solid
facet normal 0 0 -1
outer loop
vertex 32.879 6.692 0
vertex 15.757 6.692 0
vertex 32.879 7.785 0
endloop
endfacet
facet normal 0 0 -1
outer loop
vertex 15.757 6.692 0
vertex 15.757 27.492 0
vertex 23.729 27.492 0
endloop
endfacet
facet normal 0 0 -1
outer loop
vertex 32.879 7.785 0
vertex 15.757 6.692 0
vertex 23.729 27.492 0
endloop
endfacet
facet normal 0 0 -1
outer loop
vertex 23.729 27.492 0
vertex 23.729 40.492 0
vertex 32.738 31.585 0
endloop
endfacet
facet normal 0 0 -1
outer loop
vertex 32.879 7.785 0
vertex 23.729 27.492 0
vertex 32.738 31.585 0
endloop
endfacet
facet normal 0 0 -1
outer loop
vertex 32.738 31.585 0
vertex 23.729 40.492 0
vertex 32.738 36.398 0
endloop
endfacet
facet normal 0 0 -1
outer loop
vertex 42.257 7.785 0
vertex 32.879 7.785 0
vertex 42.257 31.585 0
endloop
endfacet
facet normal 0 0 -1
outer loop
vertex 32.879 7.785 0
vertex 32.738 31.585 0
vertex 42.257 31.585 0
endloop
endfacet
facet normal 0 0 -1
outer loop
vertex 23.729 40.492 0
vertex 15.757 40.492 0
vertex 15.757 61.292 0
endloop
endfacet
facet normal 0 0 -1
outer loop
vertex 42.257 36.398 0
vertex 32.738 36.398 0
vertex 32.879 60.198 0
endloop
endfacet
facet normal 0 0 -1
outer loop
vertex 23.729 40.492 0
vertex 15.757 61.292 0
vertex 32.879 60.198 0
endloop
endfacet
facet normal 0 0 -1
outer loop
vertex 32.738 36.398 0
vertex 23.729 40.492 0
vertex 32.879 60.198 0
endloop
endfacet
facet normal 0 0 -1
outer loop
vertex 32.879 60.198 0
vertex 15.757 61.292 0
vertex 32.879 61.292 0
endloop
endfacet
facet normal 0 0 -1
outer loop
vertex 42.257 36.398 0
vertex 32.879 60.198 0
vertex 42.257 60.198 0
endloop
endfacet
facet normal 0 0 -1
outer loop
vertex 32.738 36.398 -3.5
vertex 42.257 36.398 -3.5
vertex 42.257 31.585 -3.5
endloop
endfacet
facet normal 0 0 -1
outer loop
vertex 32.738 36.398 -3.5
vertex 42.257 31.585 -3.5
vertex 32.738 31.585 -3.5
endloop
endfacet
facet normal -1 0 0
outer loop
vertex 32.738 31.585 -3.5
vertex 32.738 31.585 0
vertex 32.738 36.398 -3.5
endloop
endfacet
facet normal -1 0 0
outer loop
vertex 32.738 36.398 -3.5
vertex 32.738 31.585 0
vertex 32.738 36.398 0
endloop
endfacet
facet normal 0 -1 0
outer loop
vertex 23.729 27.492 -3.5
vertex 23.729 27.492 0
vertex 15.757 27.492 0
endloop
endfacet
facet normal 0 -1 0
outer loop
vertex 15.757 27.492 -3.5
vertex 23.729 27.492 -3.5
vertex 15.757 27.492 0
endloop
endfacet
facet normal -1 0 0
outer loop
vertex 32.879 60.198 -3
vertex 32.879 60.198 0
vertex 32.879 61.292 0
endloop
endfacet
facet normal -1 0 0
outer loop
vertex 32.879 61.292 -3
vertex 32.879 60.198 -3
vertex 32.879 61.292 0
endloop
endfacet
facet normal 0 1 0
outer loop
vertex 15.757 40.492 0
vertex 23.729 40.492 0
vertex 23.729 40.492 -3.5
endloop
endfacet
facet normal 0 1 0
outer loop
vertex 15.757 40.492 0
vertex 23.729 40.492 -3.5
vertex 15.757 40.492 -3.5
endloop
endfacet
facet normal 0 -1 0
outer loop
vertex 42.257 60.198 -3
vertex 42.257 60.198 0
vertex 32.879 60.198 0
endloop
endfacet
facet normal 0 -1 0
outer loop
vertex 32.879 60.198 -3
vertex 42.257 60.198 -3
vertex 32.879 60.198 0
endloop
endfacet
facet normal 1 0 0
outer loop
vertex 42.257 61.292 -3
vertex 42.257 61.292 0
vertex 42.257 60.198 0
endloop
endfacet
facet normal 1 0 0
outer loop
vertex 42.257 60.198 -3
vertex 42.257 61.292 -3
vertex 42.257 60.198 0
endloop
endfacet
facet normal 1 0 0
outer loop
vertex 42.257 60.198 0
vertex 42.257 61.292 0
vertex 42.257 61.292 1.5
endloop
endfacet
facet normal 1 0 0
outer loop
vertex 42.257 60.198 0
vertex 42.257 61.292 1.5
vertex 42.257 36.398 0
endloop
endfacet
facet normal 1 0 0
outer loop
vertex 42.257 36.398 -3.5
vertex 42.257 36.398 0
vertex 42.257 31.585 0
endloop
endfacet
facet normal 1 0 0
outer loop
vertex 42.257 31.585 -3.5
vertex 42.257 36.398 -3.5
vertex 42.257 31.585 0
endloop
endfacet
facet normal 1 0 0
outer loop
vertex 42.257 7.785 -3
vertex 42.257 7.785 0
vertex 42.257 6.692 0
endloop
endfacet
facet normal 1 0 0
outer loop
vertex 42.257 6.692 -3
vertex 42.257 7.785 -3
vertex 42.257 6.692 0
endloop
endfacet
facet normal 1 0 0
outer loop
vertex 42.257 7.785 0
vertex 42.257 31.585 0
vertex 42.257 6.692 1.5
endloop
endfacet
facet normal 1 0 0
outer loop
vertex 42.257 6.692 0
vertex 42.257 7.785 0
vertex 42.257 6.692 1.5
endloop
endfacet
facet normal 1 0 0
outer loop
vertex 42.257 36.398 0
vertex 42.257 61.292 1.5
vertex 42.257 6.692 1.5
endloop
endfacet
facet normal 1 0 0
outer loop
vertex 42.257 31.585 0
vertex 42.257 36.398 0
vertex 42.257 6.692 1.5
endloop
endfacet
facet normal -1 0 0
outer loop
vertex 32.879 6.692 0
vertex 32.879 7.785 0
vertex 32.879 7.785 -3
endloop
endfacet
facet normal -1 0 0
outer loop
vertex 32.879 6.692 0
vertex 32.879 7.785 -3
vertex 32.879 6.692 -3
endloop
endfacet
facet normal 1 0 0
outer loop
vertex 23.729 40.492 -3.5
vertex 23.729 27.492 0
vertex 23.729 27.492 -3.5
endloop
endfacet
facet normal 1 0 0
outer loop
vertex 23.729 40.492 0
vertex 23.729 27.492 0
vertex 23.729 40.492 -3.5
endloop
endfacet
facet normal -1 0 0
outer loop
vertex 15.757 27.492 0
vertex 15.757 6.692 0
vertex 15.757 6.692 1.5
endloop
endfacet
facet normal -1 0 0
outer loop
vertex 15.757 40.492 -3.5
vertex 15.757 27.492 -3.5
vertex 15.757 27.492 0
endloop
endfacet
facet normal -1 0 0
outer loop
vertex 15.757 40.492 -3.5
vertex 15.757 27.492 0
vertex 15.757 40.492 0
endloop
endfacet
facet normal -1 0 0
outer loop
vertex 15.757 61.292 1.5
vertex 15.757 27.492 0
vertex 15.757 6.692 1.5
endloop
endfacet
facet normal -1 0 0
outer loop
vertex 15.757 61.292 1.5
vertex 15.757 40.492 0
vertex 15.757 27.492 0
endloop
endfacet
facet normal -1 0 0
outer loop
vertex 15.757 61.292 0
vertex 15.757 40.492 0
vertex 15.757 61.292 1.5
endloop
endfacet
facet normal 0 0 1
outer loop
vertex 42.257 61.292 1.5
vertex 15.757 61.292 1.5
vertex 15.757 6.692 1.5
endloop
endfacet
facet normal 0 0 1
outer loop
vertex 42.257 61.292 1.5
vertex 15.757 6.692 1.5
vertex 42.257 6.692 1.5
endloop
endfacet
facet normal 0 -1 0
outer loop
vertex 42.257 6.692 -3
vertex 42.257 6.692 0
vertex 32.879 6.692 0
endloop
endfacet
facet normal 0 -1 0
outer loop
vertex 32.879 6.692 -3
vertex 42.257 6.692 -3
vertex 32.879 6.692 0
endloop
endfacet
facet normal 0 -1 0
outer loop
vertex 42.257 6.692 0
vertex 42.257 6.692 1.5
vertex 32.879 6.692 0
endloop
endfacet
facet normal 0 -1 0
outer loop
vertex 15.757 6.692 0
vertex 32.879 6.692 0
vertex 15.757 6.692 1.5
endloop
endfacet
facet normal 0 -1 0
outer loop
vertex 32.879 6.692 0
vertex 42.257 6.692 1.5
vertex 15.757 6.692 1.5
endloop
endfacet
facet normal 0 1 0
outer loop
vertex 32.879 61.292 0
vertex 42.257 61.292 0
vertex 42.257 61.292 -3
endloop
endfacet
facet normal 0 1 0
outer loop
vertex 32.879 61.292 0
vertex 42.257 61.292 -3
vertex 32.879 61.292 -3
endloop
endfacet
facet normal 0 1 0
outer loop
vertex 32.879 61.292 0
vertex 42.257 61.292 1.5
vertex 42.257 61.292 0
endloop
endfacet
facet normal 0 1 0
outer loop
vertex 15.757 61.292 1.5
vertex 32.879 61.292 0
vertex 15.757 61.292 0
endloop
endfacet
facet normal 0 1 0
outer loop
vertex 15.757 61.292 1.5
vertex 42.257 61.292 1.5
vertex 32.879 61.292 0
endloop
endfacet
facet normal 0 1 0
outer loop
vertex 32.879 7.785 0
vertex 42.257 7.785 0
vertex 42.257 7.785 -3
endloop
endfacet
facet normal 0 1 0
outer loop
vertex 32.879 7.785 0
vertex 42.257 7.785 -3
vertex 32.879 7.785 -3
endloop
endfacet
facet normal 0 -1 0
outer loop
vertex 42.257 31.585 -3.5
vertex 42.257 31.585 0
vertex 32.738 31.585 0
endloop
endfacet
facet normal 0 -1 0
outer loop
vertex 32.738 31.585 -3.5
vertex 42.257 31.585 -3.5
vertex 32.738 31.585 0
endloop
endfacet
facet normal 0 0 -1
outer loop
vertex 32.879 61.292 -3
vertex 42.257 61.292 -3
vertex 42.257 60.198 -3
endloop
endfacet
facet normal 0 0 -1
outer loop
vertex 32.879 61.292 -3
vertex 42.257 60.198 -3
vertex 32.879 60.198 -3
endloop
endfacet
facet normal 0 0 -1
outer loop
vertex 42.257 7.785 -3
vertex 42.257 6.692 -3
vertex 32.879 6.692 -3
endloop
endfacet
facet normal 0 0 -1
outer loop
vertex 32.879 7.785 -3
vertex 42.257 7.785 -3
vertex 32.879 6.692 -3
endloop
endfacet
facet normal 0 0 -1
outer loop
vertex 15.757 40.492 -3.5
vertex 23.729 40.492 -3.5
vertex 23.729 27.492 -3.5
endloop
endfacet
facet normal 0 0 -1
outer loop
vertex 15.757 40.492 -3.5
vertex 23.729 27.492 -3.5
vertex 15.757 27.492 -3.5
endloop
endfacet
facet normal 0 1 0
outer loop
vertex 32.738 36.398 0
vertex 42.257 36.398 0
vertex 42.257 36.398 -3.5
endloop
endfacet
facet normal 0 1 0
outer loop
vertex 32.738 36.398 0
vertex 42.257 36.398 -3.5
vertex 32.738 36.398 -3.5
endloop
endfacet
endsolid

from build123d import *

# Parameters (mm, degrees)
SKETCH_1_W      = 26.5
SKETCH_1_H      = 54.6
EXTRUDE_1_DEPTH = 1.5
SKETCH_3_W      = 9.37884322
SKETCH_3_H      = 1.093530985
EXTRUDE_2_DEPTH = 3
SKETCH_4_W      = 9.519823585
SKETCH_4_H      = 4.812938029
SKETCH_4_W_2    = 7.971209668
SKETCH_4_H_2    = 13
EXTRUDE_3_DEPTH = 3.5


with BuildPart() as part:
    # ｽｹｯﾁ1 → ﾎﾞｽ - 押し出し1 (new body)
    with BuildSketch(Plane.XY):
        with Locations((29.00738196, 33.991909398)):
            Rectangle(SKETCH_1_W, SKETCH_1_H)
    extrude(amount=EXTRUDE_1_DEPTH)

    # ｽｹｯﾁ3 → ﾎﾞｽ - 押し出し2 (add)
    with BuildSketch(Plane(origin=(0, 0, 0), x_dir=(-1, 0, 0), z_dir=(0, 0, -1))):
        with Locations((-37.56796035, 60.745143906)):
            Rectangle(SKETCH_3_W, SKETCH_3_H)
    extrude_2 = extrude(amount=EXTRUDE_2_DEPTH)

    # ﾐﾗｰ1: ﾎﾞｽ - 押し出し2 across plane
    add(extrude_2.mirror(Plane(origin=(0, 33.991909398, 0), x_dir=(0, 0, 1), z_dir=(0, -1, 0))))

    # ｽｹｯﾁ4 → ﾎﾞｽ - 押し出し3 (add)
    with BuildSketch(Plane(origin=(0, 0, 0), x_dir=(-1, 0, 0), z_dir=(0, 0, -1))):
        with Locations((-37.497470167, 33.991909398)):
            Rectangle(SKETCH_4_W, SKETCH_4_H)
        with Locations((-19.742986794, 33.991909398)):
            Rectangle(SKETCH_4_W_2, SKETCH_4_H_2)
    extrude(amount=EXTRUDE_3_DEPTH)


solid = part.part
